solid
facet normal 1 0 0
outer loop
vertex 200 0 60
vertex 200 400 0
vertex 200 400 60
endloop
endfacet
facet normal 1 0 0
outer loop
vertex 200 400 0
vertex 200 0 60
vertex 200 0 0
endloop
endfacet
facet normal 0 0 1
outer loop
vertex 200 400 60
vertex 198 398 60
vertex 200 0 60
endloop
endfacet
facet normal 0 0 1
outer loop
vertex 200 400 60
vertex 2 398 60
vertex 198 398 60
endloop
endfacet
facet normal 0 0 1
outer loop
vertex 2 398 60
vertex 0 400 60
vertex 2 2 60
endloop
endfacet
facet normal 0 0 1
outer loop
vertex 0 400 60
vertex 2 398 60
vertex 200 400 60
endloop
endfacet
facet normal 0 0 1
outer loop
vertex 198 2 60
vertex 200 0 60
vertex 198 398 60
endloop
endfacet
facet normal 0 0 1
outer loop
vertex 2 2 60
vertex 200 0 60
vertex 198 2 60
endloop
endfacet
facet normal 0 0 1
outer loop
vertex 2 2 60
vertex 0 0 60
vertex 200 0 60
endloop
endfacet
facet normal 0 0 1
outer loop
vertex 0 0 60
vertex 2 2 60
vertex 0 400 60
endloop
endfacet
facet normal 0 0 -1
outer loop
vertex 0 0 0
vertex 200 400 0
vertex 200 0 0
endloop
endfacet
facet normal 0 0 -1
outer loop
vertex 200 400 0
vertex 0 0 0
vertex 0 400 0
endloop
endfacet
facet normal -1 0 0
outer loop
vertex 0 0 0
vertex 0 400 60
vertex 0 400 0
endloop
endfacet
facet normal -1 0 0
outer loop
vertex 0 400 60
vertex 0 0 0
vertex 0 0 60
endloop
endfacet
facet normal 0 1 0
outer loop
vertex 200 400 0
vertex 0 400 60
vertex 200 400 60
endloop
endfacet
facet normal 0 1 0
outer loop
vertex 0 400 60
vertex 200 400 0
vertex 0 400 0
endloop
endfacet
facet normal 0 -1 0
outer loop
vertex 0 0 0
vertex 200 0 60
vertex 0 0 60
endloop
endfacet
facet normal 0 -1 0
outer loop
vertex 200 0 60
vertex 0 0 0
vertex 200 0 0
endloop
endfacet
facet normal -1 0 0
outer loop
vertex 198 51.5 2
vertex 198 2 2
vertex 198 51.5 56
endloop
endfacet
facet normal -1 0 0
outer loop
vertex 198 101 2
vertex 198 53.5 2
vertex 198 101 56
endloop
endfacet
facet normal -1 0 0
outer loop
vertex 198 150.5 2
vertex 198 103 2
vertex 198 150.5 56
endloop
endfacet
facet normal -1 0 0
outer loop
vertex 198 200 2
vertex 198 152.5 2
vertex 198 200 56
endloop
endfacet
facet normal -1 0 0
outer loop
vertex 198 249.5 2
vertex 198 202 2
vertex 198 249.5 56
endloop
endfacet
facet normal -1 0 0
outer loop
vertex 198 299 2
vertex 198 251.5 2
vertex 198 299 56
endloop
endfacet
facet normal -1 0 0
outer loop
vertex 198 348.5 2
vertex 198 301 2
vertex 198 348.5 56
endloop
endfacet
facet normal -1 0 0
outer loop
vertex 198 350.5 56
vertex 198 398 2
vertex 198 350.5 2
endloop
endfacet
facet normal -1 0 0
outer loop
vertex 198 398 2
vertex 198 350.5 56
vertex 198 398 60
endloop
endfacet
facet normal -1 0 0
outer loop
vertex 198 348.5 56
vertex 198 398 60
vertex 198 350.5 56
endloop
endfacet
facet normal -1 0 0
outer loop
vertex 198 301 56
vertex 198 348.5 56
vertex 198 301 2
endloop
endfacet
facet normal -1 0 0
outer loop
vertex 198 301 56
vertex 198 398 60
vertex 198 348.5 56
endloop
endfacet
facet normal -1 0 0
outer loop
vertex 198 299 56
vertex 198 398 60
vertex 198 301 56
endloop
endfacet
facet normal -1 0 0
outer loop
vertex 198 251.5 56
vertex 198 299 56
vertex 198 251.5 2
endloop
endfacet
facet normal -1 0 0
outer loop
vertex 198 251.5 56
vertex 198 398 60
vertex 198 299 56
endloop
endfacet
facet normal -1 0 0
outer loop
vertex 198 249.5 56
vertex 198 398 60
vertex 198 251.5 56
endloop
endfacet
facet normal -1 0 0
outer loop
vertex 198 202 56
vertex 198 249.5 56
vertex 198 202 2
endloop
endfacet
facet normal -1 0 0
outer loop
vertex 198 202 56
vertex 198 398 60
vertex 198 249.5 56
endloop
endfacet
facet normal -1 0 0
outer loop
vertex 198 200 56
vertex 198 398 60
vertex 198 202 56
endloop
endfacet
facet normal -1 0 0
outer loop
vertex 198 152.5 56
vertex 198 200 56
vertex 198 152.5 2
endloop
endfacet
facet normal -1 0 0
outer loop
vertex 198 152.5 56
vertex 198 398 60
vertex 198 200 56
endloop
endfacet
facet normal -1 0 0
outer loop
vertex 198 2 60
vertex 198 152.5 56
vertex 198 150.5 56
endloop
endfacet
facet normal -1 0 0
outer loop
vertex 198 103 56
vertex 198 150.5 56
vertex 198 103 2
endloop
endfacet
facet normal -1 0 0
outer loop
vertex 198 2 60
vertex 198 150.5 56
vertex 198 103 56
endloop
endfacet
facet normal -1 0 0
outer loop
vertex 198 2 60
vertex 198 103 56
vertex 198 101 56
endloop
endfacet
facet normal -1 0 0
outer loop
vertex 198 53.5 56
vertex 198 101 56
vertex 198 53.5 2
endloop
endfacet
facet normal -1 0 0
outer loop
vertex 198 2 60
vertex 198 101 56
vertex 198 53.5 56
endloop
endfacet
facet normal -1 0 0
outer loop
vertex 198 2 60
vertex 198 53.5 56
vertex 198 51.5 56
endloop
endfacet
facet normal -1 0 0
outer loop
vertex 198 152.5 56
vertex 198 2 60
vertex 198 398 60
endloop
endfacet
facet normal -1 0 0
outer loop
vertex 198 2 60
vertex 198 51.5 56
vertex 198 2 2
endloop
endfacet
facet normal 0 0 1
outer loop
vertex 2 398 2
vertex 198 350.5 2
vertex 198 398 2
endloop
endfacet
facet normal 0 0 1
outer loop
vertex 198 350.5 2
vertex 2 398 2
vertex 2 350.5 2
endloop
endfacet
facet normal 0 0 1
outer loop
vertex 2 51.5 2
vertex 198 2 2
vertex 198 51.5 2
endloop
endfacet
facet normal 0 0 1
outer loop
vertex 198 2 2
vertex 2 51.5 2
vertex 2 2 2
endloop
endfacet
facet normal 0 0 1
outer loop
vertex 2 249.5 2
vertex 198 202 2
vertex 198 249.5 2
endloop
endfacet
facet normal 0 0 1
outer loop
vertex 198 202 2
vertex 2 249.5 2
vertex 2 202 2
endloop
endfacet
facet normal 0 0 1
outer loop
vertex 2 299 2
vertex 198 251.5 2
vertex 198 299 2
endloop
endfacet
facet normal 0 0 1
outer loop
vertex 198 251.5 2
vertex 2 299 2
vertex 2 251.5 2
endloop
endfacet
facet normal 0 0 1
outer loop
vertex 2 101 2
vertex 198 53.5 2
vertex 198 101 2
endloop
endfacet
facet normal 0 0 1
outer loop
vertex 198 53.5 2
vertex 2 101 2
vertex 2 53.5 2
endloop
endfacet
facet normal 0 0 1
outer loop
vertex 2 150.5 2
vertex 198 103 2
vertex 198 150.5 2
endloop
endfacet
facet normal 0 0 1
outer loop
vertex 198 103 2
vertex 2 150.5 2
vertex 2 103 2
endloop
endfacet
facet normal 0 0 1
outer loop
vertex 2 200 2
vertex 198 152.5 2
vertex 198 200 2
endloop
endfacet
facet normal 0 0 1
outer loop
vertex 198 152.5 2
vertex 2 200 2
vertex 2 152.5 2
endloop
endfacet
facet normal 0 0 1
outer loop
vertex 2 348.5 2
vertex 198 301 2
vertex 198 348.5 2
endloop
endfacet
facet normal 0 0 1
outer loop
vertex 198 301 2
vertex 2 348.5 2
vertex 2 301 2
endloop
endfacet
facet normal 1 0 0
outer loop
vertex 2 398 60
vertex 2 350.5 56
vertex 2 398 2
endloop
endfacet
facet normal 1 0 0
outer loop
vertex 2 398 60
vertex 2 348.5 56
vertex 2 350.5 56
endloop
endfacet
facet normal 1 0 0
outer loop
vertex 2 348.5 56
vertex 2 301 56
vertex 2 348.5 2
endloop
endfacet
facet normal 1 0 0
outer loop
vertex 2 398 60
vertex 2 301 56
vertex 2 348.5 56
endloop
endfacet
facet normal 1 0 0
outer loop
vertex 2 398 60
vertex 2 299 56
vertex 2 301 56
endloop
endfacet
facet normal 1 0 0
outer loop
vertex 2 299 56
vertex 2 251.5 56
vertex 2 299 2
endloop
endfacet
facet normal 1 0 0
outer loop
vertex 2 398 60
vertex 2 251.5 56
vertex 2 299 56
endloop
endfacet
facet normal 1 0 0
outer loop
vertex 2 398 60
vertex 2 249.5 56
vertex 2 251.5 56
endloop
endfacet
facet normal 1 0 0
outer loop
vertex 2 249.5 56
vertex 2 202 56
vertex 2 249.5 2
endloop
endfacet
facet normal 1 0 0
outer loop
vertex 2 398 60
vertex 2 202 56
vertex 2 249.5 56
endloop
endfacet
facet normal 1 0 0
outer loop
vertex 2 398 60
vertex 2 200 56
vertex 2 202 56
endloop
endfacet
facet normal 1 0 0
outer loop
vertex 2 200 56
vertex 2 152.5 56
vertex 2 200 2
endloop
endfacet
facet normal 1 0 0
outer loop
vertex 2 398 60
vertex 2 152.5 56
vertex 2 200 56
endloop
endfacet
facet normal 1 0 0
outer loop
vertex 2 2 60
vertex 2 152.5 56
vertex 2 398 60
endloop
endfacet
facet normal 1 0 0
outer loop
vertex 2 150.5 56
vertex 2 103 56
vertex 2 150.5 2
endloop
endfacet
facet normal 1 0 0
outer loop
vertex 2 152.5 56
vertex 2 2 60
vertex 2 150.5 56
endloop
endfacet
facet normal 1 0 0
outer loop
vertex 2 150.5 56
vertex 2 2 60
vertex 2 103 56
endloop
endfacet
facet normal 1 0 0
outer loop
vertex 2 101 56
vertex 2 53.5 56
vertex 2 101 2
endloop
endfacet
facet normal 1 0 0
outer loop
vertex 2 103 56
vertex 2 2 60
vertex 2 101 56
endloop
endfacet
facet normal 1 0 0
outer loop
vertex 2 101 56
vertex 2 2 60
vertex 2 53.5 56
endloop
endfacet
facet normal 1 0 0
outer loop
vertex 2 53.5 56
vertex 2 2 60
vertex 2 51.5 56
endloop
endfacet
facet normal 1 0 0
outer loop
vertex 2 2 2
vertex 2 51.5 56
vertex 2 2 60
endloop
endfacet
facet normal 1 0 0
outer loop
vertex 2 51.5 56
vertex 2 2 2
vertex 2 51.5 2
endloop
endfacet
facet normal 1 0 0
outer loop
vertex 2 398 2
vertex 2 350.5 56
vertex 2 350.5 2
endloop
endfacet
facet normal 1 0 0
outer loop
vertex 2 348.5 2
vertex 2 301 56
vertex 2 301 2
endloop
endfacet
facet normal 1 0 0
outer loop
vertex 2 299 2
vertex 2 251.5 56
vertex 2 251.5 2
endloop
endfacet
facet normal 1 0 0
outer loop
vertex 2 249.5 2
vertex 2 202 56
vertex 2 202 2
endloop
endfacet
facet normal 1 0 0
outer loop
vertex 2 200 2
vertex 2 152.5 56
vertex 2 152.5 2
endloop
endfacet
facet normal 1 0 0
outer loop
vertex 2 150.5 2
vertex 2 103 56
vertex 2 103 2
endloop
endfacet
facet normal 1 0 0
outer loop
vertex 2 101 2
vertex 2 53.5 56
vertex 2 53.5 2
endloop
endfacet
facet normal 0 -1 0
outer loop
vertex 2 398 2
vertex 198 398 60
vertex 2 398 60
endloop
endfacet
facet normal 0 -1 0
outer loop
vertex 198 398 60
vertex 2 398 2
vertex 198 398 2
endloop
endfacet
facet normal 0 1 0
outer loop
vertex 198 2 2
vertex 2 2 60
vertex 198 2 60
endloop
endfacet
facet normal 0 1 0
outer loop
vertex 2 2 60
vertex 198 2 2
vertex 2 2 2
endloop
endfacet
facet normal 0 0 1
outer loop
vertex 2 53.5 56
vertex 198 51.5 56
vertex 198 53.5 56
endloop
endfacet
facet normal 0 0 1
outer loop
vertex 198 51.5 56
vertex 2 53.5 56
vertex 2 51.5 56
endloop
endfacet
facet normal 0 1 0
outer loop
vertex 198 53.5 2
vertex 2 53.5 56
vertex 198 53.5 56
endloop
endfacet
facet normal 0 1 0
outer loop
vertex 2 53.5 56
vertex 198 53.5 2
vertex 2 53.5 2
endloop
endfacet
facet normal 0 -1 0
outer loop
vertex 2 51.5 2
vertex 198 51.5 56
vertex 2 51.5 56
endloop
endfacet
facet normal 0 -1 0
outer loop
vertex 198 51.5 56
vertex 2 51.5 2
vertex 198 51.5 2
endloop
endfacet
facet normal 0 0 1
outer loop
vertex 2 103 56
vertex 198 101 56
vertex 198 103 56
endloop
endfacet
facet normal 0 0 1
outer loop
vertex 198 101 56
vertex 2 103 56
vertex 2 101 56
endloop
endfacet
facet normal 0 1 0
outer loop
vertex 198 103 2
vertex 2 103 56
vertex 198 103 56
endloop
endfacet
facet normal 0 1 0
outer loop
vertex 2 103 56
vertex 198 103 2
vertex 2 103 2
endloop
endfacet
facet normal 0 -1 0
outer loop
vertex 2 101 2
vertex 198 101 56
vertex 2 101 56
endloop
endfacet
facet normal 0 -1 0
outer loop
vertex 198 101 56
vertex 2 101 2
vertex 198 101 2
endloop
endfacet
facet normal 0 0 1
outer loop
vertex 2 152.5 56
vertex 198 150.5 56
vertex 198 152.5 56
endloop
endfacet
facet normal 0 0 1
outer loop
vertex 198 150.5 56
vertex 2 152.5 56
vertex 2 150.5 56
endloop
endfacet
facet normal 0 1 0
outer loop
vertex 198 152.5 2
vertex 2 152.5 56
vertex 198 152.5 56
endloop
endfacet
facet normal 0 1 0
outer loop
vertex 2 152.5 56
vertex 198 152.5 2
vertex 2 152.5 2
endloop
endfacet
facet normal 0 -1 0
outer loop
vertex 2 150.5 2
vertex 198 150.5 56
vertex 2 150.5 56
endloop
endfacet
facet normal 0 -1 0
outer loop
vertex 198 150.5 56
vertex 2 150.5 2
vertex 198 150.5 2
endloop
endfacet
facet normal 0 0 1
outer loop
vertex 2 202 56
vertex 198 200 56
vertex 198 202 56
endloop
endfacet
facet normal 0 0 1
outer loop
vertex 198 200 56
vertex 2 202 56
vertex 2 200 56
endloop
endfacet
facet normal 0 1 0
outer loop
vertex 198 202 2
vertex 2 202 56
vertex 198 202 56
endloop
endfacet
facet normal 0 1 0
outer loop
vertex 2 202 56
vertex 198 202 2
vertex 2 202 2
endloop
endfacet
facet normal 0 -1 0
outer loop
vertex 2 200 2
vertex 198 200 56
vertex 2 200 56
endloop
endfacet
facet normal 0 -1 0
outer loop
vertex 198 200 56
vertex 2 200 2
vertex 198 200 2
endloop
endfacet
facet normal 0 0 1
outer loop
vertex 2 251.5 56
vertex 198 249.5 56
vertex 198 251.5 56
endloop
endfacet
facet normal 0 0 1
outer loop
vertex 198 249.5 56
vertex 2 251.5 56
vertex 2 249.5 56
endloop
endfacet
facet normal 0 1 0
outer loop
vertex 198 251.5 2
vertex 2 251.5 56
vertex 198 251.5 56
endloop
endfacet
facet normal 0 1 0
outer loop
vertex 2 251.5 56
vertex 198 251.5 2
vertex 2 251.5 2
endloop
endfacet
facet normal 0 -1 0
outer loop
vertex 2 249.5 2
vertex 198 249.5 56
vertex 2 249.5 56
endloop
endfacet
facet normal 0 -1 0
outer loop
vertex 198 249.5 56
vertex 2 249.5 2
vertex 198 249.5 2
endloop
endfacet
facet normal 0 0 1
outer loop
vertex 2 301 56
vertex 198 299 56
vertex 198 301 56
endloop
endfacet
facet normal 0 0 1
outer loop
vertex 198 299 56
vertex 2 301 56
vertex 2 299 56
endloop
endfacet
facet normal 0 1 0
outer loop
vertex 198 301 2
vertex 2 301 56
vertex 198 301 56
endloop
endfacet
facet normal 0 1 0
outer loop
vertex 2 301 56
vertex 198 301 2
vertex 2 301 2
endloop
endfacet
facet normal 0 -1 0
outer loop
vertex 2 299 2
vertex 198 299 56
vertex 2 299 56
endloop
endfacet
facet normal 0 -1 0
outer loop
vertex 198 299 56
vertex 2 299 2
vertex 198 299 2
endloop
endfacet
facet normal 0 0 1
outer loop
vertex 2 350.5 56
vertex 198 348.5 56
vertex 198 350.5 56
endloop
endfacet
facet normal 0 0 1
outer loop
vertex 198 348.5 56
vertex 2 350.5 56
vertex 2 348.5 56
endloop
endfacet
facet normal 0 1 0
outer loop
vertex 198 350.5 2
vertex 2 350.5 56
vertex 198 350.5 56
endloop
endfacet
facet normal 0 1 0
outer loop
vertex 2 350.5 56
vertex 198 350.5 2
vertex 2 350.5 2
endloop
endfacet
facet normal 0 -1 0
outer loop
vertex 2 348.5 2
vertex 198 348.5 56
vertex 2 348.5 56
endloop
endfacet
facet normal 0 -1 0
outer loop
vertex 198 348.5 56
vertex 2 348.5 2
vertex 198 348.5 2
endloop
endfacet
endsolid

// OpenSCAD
// This file is designed to replicate box design. It will take arguments for length, width, and height. Number of cut out sections. And a matrix for ratio of volume of cutouts.
// Wall thickness is 2 mm

// All measurements in mm. Added 0.2 to all dimentions for PLA shrinkage.

Box_Width = 200;
Box_Length = 400;
Box_Height = 60;
Number_of_Cut_outs = 8;
Mat_for_ratios_of_volume = [1,1];

Wall_thickness = 2;


//create hollow box
difference(){    
    
    cube([Box_Width,Box_Length,Box_Height]);
    
    translate([Wall_thickness , Wall_thickness, Wall_thickness])
    cube([Box_Width-(2*Wall_thickness),Box_Length-(2*Wall_thickness),Box_Height]);
    
    
}

//create walls subdivng the box
Delta_Y =  (Box_Length-(2*Wall_thickness))/Number_of_Cut_outs;

for (ii =[1:1:Number_of_Cut_outs-1]){

Y_pos_wall = Wall_thickness + Delta_Y* ii;
    
translate([Wall_thickness , Y_pos_wall , Wall_thickness])
cube([Box_Width-Wall_thickness,Wall_thickness,Box_Height*0.9]);
    
}
